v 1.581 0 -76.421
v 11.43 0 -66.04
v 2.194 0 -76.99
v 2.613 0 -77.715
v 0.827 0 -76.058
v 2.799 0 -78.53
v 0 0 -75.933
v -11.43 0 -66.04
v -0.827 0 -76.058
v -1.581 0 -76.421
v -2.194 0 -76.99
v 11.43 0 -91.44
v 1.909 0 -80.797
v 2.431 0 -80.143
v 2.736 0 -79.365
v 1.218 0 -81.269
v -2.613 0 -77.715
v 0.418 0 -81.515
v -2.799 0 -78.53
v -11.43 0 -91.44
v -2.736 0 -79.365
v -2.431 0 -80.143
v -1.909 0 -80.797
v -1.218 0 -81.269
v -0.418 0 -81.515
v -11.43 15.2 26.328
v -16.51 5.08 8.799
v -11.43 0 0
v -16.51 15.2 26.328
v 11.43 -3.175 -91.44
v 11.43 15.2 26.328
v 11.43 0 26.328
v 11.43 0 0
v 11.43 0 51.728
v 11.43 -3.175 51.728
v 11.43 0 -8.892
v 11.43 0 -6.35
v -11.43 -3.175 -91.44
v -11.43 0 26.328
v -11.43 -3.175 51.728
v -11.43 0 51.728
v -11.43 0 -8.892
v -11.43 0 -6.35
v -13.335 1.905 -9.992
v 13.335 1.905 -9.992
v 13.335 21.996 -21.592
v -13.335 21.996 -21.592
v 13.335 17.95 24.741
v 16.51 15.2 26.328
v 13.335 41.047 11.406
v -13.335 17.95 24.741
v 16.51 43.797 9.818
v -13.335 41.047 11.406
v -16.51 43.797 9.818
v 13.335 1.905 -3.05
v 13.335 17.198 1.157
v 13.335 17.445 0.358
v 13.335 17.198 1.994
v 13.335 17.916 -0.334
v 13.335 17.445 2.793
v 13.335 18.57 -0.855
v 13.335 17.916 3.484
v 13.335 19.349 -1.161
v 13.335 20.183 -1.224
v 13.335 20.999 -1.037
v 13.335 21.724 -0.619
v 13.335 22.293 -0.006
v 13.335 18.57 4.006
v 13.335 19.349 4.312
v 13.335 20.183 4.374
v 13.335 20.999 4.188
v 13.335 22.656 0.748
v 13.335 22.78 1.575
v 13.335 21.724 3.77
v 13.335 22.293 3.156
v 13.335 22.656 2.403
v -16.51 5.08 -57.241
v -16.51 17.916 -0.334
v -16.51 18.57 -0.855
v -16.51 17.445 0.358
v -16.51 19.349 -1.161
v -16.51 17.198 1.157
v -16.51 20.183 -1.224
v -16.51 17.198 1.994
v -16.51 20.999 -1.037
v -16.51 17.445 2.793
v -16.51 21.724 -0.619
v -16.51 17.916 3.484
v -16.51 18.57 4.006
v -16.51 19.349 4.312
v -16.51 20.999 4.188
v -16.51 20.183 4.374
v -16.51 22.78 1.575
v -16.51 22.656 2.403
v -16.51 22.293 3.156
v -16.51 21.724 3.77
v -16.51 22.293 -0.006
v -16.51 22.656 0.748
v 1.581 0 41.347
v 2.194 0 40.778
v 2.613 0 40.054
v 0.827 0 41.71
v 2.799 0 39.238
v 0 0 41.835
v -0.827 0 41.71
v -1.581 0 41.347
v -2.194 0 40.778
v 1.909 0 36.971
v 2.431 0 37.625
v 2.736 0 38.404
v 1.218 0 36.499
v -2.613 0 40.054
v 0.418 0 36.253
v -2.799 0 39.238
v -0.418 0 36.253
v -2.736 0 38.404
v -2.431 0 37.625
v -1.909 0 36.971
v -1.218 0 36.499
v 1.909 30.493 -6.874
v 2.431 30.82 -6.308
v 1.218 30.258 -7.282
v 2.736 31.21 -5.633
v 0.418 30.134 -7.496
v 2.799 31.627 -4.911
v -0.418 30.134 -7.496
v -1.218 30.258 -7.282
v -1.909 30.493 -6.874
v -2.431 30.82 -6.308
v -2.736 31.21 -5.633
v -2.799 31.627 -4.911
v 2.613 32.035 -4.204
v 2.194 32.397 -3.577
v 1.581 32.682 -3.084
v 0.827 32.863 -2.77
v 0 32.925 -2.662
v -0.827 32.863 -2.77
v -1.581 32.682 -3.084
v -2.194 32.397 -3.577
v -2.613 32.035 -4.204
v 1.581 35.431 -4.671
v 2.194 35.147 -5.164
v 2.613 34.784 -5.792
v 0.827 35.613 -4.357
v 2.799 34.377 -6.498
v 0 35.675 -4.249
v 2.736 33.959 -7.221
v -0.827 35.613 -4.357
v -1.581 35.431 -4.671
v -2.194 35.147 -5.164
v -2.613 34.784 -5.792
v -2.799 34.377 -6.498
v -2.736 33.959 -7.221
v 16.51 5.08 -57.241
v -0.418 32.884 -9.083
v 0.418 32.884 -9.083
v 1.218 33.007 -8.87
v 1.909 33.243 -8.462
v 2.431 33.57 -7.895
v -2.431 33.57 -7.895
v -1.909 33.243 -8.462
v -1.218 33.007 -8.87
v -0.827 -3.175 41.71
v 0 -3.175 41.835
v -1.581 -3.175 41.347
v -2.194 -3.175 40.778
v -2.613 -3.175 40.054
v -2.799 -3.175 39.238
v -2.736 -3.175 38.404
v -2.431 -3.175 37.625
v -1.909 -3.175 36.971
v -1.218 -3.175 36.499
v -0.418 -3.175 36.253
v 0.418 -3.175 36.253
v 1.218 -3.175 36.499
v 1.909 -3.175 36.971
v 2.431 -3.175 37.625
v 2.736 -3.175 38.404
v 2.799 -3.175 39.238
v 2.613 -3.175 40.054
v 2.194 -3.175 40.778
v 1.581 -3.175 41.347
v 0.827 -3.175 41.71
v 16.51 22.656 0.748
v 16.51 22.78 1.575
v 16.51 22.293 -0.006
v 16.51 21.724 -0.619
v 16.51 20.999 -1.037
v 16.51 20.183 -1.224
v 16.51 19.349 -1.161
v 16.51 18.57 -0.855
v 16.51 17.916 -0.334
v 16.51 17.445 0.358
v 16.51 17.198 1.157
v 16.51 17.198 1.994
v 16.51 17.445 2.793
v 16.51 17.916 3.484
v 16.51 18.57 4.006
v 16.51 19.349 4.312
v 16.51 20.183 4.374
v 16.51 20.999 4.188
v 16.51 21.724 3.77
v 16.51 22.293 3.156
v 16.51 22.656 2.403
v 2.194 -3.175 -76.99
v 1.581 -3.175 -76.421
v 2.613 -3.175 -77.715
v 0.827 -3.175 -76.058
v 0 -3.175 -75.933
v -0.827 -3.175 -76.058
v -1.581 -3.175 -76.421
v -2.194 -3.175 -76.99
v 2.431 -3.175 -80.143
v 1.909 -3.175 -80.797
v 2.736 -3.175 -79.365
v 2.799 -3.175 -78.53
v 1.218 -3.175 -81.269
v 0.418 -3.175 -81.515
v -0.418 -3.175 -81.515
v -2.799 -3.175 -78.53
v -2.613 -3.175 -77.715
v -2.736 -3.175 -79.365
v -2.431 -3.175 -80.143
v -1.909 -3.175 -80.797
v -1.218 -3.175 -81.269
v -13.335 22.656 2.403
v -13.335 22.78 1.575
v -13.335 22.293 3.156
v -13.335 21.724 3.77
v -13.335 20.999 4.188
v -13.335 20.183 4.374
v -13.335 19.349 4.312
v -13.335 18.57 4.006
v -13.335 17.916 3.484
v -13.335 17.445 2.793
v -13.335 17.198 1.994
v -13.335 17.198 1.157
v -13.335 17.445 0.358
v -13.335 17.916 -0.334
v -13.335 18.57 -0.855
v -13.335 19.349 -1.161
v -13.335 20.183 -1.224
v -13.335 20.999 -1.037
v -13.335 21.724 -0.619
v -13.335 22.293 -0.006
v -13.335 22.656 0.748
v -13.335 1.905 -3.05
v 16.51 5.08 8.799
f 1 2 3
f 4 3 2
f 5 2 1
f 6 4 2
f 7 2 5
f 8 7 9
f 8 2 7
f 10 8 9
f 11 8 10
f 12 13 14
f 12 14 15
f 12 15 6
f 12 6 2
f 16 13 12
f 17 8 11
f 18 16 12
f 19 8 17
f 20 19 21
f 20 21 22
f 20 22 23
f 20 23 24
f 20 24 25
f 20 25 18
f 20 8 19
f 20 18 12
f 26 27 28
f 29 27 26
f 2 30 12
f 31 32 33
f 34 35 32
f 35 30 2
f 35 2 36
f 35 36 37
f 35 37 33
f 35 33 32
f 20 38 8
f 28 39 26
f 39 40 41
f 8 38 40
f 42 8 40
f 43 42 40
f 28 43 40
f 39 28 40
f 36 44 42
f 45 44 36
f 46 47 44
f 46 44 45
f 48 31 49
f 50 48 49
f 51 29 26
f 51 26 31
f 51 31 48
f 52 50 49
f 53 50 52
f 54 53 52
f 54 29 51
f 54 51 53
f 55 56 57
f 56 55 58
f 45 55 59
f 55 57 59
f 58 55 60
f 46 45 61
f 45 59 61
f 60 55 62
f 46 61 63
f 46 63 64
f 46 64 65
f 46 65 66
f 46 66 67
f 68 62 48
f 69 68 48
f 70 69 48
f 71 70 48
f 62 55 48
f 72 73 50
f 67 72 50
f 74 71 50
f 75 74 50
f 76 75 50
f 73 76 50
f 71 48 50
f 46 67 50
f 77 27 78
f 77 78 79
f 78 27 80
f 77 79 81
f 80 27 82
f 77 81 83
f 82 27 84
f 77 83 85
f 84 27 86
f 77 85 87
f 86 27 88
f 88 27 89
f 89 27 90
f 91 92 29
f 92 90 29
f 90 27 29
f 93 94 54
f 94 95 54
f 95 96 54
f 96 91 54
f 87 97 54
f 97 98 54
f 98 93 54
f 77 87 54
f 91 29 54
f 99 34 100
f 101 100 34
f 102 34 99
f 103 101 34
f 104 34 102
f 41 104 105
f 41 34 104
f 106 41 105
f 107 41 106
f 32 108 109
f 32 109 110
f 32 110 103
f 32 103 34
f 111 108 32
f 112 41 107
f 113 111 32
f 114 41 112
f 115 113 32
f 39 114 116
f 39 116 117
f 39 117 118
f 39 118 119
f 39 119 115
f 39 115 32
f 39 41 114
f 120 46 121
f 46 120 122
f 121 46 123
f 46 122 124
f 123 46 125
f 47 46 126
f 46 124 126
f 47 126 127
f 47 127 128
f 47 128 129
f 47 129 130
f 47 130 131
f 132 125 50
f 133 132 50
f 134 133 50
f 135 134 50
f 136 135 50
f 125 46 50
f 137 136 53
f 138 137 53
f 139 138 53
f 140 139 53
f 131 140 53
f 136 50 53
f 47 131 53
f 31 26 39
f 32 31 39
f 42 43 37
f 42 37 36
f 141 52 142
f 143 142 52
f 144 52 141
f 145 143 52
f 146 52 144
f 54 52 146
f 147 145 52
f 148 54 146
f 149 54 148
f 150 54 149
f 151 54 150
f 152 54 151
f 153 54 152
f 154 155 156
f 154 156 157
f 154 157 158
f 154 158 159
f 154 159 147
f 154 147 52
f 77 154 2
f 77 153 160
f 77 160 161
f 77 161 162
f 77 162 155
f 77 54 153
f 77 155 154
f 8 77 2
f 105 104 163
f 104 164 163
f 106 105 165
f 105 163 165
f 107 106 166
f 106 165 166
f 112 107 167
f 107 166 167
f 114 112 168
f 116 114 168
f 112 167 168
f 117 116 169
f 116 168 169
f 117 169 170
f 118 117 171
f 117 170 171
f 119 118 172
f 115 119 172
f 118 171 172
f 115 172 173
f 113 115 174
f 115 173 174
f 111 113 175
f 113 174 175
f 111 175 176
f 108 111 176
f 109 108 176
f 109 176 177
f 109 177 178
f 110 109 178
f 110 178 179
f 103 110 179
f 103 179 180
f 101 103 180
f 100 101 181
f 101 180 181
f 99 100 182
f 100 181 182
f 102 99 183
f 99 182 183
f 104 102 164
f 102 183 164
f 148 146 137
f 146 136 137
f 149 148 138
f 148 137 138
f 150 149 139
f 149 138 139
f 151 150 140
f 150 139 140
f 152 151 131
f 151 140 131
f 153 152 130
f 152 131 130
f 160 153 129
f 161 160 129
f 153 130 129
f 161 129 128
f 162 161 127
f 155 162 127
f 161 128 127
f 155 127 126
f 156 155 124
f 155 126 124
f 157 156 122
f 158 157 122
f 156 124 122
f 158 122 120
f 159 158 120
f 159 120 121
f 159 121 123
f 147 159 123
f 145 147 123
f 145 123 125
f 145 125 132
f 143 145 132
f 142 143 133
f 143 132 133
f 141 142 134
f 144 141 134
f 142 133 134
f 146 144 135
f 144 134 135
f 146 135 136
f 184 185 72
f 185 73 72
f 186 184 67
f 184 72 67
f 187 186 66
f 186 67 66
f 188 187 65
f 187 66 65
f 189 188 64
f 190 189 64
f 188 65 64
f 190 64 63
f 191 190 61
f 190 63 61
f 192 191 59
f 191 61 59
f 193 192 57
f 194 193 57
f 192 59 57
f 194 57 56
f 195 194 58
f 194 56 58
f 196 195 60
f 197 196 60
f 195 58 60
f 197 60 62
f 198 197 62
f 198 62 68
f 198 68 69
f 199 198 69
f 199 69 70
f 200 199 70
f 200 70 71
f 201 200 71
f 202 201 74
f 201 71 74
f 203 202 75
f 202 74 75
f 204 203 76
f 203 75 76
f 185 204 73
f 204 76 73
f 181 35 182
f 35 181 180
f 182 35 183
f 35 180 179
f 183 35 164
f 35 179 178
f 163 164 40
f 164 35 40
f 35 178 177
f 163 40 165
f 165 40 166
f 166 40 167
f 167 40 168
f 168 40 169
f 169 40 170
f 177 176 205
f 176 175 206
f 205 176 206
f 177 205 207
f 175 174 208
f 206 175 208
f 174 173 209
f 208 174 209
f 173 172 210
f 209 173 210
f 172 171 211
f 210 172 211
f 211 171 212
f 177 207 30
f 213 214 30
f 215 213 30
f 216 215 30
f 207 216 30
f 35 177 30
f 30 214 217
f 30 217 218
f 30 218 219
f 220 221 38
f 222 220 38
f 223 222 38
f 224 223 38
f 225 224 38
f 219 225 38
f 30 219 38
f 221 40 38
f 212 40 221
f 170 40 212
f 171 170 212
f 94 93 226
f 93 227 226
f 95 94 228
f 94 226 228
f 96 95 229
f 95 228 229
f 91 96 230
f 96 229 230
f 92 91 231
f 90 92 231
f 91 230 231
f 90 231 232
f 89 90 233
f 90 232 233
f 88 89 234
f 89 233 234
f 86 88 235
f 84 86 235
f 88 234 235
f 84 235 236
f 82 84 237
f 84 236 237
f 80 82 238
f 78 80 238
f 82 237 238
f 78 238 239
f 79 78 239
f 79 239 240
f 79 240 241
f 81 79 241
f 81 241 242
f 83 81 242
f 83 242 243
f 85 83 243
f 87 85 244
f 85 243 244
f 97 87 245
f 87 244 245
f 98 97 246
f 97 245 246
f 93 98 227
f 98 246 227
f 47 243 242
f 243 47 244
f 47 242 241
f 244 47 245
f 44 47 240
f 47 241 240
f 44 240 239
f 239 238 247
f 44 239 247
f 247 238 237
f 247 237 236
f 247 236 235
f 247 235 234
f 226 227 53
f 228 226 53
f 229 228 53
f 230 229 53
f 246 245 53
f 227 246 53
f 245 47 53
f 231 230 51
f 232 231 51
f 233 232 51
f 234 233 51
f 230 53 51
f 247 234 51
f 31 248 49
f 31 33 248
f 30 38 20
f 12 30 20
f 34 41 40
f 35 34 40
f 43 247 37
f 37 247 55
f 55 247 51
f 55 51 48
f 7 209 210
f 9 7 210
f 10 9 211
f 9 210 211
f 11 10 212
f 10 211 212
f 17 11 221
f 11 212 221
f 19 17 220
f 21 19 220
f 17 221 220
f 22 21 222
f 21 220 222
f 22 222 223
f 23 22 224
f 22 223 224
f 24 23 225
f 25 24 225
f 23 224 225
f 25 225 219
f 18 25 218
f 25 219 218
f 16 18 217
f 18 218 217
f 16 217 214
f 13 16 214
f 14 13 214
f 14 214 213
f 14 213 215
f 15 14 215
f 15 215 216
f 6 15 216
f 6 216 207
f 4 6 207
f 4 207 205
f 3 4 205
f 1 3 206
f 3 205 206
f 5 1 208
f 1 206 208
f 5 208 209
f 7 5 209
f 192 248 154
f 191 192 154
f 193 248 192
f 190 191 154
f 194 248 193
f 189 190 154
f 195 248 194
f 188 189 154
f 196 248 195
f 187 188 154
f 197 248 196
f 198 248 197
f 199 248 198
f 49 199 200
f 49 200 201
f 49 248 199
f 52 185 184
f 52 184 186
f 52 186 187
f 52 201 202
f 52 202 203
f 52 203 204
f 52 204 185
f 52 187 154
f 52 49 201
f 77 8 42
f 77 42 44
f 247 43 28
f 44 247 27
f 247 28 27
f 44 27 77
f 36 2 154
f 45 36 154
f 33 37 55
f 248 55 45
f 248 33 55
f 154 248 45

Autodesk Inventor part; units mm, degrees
ref_plane "YZ Plane" through (0, 0, 0) normal (1, 0, 0) x (0, 1, 0)
ref_plane "XZ Plane" through (0, 0, 0) normal (0, 1, 0) x (-1, 0, 0)
ref_plane "XY Plane" through (0, 0, 0) normal (0, 0, 1) x (1, 0, 0)
sketch "Sketch1" plane through (0, 0, 0) normal (1, 0, 0) x (0, 1, 0)
  line L0 (0, 0) -> (15.2005, 26.3281)
  line L1 (15.2005, 26.3281) -> (43.7967, 9.8181)
  line L2 (0, -98.8011) -> (0, 41.6267) projected
  line L3 (43.7967, 9.8181) -> (0, -66.04)
  line L4 (0, 0) -> (0, -66.04)
  line L5 (19.05, 24.1056) -> (0, -8.89) construction
  dimension "d0" = 33.02
  dimension "d1" = 30
  dimension "d5" = 4.445
  dimension "d6" = 38.1
extrude "Extrusion1" add sketch "Sketch1" along normal mid plane 33.02
sketch "Sketch2" plane through (-16.51, 15.2005, 26.3281) normal (0, 0.5, 0.8660254) x (1, 0, 0)
  line L0 (0, 0) -> (33.02, 0) construction
  line L1 (33.02, 0) -> (33.02, 33.02) construction
  line L2 (0, 0) -> (33.02, 33.02) construction
  line L3 (33.02, 33.02) -> (0, 33.02) construction
  line L4 (0, 33.02) -> (33.02, 0) construction
  line L5 (3.175, 3.175) -> (29.845, 3.175)
  line L6 (29.845, 3.175) -> (29.845, 29.845)
  line L7 (29.845, 29.845) -> (3.175, 29.845)
  line L8 (3.175, 29.845) -> (3.175, 3.175)
  line L9 (3.175, 3.175) -> (29.845, 29.845) construction
  line L10 (29.845, 3.175) -> (3.175, 29.845) construction
  point P0 (16.51, 0)
  point P1 (16.51, 16.51)
  dimension "d7" = 26.67
extrude "Extrusion2" cut sketch "Sketch2" against normal blind 38.1
sketch "Sketch3" plane through (0, 0, 0) normal (1, 0, 0) x (0, 1, 0)
  line L0 (15.2005, 26.3281) -> (0, 0) projected
  line L1 (0, 0) -> (0, -66.04) projected
  line L2 (0, -66.04) -> (43.7967, 9.8181) projected
  line L3 (21.997, -21.59) -> (0, -8.89) projected
  line L4 (17.9501, 24.7406) -> (0, -6.35) projected
  line L5 (0, 0) -> (0, -66.04)
  line L6 (15.2005, 26.3281) -> (1.6498, 26.3281) construction
  line L7 (0, 0) -> (15.2005, 26.3281) projected
  line L8 (0, 0) -> (0, 51.7281)
  line L9 (43.7967, 9.8181) -> (0, -66.04) projected
  line L10 (0, -66.04) -> (0, -91.44)
  line L11 (0, -134.3611) -> (0, 77.1867) projected
  line L12 (0, 51.7281) -> (-3.175, 51.7281)
  line L13 (-3.175, 51.7281) -> (-3.175, -91.44)
  line L14 (-3.175, -91.44) -> (0, -91.44)
  point P0 (1.0999, -13.335)
  point P1 (0, -15.24)
  point P2 (0, -6.35)
  dimension "d10" = 25.4
  dimension "d11" = 25.4
  dimension "d12" = 3.175
  dimension "supportBaseLength" = 143.1681
extrude "Extrusion3" add sketch "Sketch3" along normal mid plane 22.86
sketch "Sketch5" plane through (0, 0, 0) normal (1, 0, 0) x (0, 1, 0)
  line L0 (0, 0) -> (15.2005, 26.3281) projected
  line L1 (0, 51.7281) -> (0, 0) projected
  line L2 (15.2005, 26.3281) -> (43.7967, 9.8181) projected
  line L3 (15.2005, 26.3281) -> (0, 26.3281)
  line L4 (0, 0) -> (15.2005, 26.3281)
extrude "Extrusion5" add sketch "Sketch5" along normal mid plane 22.86
sketch "Sketch4" plane through (0, 0, 0) normal (0, 0, 1) x (1, 0, 0)
  line L0 (16.51, 43.7967) -> (-16.51, 43.7967) projected
  line L1 (16.51, 0) -> (16.51, 43.7967) projected
  line L2 (16.51, 0) -> (11.43, 0) projected
  line L3 (11.43, 0) -> (-11.43, 0) projected
  line L4 (-11.43, 0) -> (-16.51, 0) projected
  line L5 (-16.51, 43.7967) -> (-16.51, 0) projected
  line L6 (-11.43, 0) -> (-11.43, -3.175) projected
  line L7 (11.43, -3.175) -> (-11.43, -3.175) projected
  line L8 (11.43, -3.175) -> (11.43, 0) projected
  line L9 (-11.43, 0) -> (-16.51, 5.08)
  line L10 (-16.51, 43.7967) -> (-16.51, 0) projected
  line L11 (-16.51, 5.08) -> (-16.51, 0)
  line L12 (0, 0) -> (0, 43.7967) construction
  line L13 (11.43, 0) -> (16.51, 0)
  line L14 (11.43, 0) -> (16.51, 5.08)
  line L15 (16.51, 5.08) -> (16.51, 0)
  dimension "d15" = 45
extrude "Extrusion4" cut sketch "Sketch4" against normal up to surface (143.1681 mm away) from surface at 51.7281 contours L1 L2 L14 | L9 L4 L5
sketch "Sketch6" plane through (-11.43, 0, 51.7281) normal (0, 1, 0) x (1, 0, 0)
  line L0 (22.86, 143.1681) -> (0, 143.1681) construction
  line L1 (11.43, 143.1681) -> (11.43, 0) construction
  line L2 (22.86, 0) -> (0, 0) construction
  point P0 (11.43, 51.7281)
  point P1 (11.43, 130.4681)
  point P2 (11.43, 12.7)
  dimension "d21" = 12.7
  dimension "d22" = 12.7
hole "Hole1" at (0, 0, -78.74) at (0, 0, 39.0281) direction (0, -1, 0) diameter 5.6134 end through all clearance for "Flat Head Machine Screw (82)" size "#10" standard "Ansi Unified Screw Threads"
sketch "Sketch9" plane through (0, 0, 0) normal (1, 0, 0) x (0, 1, 0)
  line L0 (1.905, -3.0504) -> (1.905, -9.9899) projected
  line L1 (1.905, -9.9899) -> (21.997, -21.59) projected
  line L2 (41.047, 11.4056) -> (21.997, -21.59) projected
  line L3 (17.9501, 24.7406) -> (41.047, 11.4056) projected
  line L4 (17.9501, 24.7406) -> (1.905, -3.0504) projected
  line L5 (29.4986, 18.0731) -> (10.4486, -14.9225) construction
  line L6 (1.905, -9.9899) -> (21.997, -21.59) construction
  circle A0 centre (19.9736, 1.5753) radius 2.8067
  point P0 (0, 0)
  dimension "d30" = 5.6134
extrude "Extrusion6" cut sketch "Sketch9" along normal through all both and the other way through all contours A0
sketch "Sketch10" plane through (-16.51, 43.7967, 9.8181) normal (0, 0.8660254, -0.5) x (1, 0, 0)
  line L0 (3.175, 0) -> (29.845, 0) construction
  line L1 (16.51, 0) -> (16.51, 77.7875) construction
  point P0 (16.51, 30.401)
  point P1 (16.51, 19.05)
  dimension "d33" = 19.05
hole "Hole2" at (0, 34.2717, -6.6797) direction (0, -0.8660254, 0.5) diameter 5.6134 depth 3.175 clearance for "Flat Head Machine Screw (82)" size "#10" standard "Ansi Unified Screw Threads"
equation "\"d0\" = widthToSupportExtrusion"
equation "\"d1\" = attachementAngle"
equation "\"d6\" = insertDepth"
equation "\"d2\" = widthToSupportExtrusion"
equation "\"d7\" = insertForExtrusion"
equation "\"d8\" = insertDepth"
equation "\"d12\" = supportBaseDepth"
equation "\"d13\" = supportBaseWidth"
equation "\"attachementAngle\" = 30deg"
equation "\"extrusionSize\" = 25.4"
equation "\"wallThickness\" = 3.175"
equation "\"slipClearance\" = 0.635"
equation "\"insertForExtrusion\" = extrusionSize + 2 * slipClearance"
equation "\"widthToSupportExtrusion\" = insertForExtrusion + 2 * wallThickness"
equation "\"insertDepth\" = 38.1"
equation "\"supportBaseWidth\" = 22.86"
equation "\"supportBaseDepth\" = 3.175"
properties part number "30DegreeAttachementV04"
